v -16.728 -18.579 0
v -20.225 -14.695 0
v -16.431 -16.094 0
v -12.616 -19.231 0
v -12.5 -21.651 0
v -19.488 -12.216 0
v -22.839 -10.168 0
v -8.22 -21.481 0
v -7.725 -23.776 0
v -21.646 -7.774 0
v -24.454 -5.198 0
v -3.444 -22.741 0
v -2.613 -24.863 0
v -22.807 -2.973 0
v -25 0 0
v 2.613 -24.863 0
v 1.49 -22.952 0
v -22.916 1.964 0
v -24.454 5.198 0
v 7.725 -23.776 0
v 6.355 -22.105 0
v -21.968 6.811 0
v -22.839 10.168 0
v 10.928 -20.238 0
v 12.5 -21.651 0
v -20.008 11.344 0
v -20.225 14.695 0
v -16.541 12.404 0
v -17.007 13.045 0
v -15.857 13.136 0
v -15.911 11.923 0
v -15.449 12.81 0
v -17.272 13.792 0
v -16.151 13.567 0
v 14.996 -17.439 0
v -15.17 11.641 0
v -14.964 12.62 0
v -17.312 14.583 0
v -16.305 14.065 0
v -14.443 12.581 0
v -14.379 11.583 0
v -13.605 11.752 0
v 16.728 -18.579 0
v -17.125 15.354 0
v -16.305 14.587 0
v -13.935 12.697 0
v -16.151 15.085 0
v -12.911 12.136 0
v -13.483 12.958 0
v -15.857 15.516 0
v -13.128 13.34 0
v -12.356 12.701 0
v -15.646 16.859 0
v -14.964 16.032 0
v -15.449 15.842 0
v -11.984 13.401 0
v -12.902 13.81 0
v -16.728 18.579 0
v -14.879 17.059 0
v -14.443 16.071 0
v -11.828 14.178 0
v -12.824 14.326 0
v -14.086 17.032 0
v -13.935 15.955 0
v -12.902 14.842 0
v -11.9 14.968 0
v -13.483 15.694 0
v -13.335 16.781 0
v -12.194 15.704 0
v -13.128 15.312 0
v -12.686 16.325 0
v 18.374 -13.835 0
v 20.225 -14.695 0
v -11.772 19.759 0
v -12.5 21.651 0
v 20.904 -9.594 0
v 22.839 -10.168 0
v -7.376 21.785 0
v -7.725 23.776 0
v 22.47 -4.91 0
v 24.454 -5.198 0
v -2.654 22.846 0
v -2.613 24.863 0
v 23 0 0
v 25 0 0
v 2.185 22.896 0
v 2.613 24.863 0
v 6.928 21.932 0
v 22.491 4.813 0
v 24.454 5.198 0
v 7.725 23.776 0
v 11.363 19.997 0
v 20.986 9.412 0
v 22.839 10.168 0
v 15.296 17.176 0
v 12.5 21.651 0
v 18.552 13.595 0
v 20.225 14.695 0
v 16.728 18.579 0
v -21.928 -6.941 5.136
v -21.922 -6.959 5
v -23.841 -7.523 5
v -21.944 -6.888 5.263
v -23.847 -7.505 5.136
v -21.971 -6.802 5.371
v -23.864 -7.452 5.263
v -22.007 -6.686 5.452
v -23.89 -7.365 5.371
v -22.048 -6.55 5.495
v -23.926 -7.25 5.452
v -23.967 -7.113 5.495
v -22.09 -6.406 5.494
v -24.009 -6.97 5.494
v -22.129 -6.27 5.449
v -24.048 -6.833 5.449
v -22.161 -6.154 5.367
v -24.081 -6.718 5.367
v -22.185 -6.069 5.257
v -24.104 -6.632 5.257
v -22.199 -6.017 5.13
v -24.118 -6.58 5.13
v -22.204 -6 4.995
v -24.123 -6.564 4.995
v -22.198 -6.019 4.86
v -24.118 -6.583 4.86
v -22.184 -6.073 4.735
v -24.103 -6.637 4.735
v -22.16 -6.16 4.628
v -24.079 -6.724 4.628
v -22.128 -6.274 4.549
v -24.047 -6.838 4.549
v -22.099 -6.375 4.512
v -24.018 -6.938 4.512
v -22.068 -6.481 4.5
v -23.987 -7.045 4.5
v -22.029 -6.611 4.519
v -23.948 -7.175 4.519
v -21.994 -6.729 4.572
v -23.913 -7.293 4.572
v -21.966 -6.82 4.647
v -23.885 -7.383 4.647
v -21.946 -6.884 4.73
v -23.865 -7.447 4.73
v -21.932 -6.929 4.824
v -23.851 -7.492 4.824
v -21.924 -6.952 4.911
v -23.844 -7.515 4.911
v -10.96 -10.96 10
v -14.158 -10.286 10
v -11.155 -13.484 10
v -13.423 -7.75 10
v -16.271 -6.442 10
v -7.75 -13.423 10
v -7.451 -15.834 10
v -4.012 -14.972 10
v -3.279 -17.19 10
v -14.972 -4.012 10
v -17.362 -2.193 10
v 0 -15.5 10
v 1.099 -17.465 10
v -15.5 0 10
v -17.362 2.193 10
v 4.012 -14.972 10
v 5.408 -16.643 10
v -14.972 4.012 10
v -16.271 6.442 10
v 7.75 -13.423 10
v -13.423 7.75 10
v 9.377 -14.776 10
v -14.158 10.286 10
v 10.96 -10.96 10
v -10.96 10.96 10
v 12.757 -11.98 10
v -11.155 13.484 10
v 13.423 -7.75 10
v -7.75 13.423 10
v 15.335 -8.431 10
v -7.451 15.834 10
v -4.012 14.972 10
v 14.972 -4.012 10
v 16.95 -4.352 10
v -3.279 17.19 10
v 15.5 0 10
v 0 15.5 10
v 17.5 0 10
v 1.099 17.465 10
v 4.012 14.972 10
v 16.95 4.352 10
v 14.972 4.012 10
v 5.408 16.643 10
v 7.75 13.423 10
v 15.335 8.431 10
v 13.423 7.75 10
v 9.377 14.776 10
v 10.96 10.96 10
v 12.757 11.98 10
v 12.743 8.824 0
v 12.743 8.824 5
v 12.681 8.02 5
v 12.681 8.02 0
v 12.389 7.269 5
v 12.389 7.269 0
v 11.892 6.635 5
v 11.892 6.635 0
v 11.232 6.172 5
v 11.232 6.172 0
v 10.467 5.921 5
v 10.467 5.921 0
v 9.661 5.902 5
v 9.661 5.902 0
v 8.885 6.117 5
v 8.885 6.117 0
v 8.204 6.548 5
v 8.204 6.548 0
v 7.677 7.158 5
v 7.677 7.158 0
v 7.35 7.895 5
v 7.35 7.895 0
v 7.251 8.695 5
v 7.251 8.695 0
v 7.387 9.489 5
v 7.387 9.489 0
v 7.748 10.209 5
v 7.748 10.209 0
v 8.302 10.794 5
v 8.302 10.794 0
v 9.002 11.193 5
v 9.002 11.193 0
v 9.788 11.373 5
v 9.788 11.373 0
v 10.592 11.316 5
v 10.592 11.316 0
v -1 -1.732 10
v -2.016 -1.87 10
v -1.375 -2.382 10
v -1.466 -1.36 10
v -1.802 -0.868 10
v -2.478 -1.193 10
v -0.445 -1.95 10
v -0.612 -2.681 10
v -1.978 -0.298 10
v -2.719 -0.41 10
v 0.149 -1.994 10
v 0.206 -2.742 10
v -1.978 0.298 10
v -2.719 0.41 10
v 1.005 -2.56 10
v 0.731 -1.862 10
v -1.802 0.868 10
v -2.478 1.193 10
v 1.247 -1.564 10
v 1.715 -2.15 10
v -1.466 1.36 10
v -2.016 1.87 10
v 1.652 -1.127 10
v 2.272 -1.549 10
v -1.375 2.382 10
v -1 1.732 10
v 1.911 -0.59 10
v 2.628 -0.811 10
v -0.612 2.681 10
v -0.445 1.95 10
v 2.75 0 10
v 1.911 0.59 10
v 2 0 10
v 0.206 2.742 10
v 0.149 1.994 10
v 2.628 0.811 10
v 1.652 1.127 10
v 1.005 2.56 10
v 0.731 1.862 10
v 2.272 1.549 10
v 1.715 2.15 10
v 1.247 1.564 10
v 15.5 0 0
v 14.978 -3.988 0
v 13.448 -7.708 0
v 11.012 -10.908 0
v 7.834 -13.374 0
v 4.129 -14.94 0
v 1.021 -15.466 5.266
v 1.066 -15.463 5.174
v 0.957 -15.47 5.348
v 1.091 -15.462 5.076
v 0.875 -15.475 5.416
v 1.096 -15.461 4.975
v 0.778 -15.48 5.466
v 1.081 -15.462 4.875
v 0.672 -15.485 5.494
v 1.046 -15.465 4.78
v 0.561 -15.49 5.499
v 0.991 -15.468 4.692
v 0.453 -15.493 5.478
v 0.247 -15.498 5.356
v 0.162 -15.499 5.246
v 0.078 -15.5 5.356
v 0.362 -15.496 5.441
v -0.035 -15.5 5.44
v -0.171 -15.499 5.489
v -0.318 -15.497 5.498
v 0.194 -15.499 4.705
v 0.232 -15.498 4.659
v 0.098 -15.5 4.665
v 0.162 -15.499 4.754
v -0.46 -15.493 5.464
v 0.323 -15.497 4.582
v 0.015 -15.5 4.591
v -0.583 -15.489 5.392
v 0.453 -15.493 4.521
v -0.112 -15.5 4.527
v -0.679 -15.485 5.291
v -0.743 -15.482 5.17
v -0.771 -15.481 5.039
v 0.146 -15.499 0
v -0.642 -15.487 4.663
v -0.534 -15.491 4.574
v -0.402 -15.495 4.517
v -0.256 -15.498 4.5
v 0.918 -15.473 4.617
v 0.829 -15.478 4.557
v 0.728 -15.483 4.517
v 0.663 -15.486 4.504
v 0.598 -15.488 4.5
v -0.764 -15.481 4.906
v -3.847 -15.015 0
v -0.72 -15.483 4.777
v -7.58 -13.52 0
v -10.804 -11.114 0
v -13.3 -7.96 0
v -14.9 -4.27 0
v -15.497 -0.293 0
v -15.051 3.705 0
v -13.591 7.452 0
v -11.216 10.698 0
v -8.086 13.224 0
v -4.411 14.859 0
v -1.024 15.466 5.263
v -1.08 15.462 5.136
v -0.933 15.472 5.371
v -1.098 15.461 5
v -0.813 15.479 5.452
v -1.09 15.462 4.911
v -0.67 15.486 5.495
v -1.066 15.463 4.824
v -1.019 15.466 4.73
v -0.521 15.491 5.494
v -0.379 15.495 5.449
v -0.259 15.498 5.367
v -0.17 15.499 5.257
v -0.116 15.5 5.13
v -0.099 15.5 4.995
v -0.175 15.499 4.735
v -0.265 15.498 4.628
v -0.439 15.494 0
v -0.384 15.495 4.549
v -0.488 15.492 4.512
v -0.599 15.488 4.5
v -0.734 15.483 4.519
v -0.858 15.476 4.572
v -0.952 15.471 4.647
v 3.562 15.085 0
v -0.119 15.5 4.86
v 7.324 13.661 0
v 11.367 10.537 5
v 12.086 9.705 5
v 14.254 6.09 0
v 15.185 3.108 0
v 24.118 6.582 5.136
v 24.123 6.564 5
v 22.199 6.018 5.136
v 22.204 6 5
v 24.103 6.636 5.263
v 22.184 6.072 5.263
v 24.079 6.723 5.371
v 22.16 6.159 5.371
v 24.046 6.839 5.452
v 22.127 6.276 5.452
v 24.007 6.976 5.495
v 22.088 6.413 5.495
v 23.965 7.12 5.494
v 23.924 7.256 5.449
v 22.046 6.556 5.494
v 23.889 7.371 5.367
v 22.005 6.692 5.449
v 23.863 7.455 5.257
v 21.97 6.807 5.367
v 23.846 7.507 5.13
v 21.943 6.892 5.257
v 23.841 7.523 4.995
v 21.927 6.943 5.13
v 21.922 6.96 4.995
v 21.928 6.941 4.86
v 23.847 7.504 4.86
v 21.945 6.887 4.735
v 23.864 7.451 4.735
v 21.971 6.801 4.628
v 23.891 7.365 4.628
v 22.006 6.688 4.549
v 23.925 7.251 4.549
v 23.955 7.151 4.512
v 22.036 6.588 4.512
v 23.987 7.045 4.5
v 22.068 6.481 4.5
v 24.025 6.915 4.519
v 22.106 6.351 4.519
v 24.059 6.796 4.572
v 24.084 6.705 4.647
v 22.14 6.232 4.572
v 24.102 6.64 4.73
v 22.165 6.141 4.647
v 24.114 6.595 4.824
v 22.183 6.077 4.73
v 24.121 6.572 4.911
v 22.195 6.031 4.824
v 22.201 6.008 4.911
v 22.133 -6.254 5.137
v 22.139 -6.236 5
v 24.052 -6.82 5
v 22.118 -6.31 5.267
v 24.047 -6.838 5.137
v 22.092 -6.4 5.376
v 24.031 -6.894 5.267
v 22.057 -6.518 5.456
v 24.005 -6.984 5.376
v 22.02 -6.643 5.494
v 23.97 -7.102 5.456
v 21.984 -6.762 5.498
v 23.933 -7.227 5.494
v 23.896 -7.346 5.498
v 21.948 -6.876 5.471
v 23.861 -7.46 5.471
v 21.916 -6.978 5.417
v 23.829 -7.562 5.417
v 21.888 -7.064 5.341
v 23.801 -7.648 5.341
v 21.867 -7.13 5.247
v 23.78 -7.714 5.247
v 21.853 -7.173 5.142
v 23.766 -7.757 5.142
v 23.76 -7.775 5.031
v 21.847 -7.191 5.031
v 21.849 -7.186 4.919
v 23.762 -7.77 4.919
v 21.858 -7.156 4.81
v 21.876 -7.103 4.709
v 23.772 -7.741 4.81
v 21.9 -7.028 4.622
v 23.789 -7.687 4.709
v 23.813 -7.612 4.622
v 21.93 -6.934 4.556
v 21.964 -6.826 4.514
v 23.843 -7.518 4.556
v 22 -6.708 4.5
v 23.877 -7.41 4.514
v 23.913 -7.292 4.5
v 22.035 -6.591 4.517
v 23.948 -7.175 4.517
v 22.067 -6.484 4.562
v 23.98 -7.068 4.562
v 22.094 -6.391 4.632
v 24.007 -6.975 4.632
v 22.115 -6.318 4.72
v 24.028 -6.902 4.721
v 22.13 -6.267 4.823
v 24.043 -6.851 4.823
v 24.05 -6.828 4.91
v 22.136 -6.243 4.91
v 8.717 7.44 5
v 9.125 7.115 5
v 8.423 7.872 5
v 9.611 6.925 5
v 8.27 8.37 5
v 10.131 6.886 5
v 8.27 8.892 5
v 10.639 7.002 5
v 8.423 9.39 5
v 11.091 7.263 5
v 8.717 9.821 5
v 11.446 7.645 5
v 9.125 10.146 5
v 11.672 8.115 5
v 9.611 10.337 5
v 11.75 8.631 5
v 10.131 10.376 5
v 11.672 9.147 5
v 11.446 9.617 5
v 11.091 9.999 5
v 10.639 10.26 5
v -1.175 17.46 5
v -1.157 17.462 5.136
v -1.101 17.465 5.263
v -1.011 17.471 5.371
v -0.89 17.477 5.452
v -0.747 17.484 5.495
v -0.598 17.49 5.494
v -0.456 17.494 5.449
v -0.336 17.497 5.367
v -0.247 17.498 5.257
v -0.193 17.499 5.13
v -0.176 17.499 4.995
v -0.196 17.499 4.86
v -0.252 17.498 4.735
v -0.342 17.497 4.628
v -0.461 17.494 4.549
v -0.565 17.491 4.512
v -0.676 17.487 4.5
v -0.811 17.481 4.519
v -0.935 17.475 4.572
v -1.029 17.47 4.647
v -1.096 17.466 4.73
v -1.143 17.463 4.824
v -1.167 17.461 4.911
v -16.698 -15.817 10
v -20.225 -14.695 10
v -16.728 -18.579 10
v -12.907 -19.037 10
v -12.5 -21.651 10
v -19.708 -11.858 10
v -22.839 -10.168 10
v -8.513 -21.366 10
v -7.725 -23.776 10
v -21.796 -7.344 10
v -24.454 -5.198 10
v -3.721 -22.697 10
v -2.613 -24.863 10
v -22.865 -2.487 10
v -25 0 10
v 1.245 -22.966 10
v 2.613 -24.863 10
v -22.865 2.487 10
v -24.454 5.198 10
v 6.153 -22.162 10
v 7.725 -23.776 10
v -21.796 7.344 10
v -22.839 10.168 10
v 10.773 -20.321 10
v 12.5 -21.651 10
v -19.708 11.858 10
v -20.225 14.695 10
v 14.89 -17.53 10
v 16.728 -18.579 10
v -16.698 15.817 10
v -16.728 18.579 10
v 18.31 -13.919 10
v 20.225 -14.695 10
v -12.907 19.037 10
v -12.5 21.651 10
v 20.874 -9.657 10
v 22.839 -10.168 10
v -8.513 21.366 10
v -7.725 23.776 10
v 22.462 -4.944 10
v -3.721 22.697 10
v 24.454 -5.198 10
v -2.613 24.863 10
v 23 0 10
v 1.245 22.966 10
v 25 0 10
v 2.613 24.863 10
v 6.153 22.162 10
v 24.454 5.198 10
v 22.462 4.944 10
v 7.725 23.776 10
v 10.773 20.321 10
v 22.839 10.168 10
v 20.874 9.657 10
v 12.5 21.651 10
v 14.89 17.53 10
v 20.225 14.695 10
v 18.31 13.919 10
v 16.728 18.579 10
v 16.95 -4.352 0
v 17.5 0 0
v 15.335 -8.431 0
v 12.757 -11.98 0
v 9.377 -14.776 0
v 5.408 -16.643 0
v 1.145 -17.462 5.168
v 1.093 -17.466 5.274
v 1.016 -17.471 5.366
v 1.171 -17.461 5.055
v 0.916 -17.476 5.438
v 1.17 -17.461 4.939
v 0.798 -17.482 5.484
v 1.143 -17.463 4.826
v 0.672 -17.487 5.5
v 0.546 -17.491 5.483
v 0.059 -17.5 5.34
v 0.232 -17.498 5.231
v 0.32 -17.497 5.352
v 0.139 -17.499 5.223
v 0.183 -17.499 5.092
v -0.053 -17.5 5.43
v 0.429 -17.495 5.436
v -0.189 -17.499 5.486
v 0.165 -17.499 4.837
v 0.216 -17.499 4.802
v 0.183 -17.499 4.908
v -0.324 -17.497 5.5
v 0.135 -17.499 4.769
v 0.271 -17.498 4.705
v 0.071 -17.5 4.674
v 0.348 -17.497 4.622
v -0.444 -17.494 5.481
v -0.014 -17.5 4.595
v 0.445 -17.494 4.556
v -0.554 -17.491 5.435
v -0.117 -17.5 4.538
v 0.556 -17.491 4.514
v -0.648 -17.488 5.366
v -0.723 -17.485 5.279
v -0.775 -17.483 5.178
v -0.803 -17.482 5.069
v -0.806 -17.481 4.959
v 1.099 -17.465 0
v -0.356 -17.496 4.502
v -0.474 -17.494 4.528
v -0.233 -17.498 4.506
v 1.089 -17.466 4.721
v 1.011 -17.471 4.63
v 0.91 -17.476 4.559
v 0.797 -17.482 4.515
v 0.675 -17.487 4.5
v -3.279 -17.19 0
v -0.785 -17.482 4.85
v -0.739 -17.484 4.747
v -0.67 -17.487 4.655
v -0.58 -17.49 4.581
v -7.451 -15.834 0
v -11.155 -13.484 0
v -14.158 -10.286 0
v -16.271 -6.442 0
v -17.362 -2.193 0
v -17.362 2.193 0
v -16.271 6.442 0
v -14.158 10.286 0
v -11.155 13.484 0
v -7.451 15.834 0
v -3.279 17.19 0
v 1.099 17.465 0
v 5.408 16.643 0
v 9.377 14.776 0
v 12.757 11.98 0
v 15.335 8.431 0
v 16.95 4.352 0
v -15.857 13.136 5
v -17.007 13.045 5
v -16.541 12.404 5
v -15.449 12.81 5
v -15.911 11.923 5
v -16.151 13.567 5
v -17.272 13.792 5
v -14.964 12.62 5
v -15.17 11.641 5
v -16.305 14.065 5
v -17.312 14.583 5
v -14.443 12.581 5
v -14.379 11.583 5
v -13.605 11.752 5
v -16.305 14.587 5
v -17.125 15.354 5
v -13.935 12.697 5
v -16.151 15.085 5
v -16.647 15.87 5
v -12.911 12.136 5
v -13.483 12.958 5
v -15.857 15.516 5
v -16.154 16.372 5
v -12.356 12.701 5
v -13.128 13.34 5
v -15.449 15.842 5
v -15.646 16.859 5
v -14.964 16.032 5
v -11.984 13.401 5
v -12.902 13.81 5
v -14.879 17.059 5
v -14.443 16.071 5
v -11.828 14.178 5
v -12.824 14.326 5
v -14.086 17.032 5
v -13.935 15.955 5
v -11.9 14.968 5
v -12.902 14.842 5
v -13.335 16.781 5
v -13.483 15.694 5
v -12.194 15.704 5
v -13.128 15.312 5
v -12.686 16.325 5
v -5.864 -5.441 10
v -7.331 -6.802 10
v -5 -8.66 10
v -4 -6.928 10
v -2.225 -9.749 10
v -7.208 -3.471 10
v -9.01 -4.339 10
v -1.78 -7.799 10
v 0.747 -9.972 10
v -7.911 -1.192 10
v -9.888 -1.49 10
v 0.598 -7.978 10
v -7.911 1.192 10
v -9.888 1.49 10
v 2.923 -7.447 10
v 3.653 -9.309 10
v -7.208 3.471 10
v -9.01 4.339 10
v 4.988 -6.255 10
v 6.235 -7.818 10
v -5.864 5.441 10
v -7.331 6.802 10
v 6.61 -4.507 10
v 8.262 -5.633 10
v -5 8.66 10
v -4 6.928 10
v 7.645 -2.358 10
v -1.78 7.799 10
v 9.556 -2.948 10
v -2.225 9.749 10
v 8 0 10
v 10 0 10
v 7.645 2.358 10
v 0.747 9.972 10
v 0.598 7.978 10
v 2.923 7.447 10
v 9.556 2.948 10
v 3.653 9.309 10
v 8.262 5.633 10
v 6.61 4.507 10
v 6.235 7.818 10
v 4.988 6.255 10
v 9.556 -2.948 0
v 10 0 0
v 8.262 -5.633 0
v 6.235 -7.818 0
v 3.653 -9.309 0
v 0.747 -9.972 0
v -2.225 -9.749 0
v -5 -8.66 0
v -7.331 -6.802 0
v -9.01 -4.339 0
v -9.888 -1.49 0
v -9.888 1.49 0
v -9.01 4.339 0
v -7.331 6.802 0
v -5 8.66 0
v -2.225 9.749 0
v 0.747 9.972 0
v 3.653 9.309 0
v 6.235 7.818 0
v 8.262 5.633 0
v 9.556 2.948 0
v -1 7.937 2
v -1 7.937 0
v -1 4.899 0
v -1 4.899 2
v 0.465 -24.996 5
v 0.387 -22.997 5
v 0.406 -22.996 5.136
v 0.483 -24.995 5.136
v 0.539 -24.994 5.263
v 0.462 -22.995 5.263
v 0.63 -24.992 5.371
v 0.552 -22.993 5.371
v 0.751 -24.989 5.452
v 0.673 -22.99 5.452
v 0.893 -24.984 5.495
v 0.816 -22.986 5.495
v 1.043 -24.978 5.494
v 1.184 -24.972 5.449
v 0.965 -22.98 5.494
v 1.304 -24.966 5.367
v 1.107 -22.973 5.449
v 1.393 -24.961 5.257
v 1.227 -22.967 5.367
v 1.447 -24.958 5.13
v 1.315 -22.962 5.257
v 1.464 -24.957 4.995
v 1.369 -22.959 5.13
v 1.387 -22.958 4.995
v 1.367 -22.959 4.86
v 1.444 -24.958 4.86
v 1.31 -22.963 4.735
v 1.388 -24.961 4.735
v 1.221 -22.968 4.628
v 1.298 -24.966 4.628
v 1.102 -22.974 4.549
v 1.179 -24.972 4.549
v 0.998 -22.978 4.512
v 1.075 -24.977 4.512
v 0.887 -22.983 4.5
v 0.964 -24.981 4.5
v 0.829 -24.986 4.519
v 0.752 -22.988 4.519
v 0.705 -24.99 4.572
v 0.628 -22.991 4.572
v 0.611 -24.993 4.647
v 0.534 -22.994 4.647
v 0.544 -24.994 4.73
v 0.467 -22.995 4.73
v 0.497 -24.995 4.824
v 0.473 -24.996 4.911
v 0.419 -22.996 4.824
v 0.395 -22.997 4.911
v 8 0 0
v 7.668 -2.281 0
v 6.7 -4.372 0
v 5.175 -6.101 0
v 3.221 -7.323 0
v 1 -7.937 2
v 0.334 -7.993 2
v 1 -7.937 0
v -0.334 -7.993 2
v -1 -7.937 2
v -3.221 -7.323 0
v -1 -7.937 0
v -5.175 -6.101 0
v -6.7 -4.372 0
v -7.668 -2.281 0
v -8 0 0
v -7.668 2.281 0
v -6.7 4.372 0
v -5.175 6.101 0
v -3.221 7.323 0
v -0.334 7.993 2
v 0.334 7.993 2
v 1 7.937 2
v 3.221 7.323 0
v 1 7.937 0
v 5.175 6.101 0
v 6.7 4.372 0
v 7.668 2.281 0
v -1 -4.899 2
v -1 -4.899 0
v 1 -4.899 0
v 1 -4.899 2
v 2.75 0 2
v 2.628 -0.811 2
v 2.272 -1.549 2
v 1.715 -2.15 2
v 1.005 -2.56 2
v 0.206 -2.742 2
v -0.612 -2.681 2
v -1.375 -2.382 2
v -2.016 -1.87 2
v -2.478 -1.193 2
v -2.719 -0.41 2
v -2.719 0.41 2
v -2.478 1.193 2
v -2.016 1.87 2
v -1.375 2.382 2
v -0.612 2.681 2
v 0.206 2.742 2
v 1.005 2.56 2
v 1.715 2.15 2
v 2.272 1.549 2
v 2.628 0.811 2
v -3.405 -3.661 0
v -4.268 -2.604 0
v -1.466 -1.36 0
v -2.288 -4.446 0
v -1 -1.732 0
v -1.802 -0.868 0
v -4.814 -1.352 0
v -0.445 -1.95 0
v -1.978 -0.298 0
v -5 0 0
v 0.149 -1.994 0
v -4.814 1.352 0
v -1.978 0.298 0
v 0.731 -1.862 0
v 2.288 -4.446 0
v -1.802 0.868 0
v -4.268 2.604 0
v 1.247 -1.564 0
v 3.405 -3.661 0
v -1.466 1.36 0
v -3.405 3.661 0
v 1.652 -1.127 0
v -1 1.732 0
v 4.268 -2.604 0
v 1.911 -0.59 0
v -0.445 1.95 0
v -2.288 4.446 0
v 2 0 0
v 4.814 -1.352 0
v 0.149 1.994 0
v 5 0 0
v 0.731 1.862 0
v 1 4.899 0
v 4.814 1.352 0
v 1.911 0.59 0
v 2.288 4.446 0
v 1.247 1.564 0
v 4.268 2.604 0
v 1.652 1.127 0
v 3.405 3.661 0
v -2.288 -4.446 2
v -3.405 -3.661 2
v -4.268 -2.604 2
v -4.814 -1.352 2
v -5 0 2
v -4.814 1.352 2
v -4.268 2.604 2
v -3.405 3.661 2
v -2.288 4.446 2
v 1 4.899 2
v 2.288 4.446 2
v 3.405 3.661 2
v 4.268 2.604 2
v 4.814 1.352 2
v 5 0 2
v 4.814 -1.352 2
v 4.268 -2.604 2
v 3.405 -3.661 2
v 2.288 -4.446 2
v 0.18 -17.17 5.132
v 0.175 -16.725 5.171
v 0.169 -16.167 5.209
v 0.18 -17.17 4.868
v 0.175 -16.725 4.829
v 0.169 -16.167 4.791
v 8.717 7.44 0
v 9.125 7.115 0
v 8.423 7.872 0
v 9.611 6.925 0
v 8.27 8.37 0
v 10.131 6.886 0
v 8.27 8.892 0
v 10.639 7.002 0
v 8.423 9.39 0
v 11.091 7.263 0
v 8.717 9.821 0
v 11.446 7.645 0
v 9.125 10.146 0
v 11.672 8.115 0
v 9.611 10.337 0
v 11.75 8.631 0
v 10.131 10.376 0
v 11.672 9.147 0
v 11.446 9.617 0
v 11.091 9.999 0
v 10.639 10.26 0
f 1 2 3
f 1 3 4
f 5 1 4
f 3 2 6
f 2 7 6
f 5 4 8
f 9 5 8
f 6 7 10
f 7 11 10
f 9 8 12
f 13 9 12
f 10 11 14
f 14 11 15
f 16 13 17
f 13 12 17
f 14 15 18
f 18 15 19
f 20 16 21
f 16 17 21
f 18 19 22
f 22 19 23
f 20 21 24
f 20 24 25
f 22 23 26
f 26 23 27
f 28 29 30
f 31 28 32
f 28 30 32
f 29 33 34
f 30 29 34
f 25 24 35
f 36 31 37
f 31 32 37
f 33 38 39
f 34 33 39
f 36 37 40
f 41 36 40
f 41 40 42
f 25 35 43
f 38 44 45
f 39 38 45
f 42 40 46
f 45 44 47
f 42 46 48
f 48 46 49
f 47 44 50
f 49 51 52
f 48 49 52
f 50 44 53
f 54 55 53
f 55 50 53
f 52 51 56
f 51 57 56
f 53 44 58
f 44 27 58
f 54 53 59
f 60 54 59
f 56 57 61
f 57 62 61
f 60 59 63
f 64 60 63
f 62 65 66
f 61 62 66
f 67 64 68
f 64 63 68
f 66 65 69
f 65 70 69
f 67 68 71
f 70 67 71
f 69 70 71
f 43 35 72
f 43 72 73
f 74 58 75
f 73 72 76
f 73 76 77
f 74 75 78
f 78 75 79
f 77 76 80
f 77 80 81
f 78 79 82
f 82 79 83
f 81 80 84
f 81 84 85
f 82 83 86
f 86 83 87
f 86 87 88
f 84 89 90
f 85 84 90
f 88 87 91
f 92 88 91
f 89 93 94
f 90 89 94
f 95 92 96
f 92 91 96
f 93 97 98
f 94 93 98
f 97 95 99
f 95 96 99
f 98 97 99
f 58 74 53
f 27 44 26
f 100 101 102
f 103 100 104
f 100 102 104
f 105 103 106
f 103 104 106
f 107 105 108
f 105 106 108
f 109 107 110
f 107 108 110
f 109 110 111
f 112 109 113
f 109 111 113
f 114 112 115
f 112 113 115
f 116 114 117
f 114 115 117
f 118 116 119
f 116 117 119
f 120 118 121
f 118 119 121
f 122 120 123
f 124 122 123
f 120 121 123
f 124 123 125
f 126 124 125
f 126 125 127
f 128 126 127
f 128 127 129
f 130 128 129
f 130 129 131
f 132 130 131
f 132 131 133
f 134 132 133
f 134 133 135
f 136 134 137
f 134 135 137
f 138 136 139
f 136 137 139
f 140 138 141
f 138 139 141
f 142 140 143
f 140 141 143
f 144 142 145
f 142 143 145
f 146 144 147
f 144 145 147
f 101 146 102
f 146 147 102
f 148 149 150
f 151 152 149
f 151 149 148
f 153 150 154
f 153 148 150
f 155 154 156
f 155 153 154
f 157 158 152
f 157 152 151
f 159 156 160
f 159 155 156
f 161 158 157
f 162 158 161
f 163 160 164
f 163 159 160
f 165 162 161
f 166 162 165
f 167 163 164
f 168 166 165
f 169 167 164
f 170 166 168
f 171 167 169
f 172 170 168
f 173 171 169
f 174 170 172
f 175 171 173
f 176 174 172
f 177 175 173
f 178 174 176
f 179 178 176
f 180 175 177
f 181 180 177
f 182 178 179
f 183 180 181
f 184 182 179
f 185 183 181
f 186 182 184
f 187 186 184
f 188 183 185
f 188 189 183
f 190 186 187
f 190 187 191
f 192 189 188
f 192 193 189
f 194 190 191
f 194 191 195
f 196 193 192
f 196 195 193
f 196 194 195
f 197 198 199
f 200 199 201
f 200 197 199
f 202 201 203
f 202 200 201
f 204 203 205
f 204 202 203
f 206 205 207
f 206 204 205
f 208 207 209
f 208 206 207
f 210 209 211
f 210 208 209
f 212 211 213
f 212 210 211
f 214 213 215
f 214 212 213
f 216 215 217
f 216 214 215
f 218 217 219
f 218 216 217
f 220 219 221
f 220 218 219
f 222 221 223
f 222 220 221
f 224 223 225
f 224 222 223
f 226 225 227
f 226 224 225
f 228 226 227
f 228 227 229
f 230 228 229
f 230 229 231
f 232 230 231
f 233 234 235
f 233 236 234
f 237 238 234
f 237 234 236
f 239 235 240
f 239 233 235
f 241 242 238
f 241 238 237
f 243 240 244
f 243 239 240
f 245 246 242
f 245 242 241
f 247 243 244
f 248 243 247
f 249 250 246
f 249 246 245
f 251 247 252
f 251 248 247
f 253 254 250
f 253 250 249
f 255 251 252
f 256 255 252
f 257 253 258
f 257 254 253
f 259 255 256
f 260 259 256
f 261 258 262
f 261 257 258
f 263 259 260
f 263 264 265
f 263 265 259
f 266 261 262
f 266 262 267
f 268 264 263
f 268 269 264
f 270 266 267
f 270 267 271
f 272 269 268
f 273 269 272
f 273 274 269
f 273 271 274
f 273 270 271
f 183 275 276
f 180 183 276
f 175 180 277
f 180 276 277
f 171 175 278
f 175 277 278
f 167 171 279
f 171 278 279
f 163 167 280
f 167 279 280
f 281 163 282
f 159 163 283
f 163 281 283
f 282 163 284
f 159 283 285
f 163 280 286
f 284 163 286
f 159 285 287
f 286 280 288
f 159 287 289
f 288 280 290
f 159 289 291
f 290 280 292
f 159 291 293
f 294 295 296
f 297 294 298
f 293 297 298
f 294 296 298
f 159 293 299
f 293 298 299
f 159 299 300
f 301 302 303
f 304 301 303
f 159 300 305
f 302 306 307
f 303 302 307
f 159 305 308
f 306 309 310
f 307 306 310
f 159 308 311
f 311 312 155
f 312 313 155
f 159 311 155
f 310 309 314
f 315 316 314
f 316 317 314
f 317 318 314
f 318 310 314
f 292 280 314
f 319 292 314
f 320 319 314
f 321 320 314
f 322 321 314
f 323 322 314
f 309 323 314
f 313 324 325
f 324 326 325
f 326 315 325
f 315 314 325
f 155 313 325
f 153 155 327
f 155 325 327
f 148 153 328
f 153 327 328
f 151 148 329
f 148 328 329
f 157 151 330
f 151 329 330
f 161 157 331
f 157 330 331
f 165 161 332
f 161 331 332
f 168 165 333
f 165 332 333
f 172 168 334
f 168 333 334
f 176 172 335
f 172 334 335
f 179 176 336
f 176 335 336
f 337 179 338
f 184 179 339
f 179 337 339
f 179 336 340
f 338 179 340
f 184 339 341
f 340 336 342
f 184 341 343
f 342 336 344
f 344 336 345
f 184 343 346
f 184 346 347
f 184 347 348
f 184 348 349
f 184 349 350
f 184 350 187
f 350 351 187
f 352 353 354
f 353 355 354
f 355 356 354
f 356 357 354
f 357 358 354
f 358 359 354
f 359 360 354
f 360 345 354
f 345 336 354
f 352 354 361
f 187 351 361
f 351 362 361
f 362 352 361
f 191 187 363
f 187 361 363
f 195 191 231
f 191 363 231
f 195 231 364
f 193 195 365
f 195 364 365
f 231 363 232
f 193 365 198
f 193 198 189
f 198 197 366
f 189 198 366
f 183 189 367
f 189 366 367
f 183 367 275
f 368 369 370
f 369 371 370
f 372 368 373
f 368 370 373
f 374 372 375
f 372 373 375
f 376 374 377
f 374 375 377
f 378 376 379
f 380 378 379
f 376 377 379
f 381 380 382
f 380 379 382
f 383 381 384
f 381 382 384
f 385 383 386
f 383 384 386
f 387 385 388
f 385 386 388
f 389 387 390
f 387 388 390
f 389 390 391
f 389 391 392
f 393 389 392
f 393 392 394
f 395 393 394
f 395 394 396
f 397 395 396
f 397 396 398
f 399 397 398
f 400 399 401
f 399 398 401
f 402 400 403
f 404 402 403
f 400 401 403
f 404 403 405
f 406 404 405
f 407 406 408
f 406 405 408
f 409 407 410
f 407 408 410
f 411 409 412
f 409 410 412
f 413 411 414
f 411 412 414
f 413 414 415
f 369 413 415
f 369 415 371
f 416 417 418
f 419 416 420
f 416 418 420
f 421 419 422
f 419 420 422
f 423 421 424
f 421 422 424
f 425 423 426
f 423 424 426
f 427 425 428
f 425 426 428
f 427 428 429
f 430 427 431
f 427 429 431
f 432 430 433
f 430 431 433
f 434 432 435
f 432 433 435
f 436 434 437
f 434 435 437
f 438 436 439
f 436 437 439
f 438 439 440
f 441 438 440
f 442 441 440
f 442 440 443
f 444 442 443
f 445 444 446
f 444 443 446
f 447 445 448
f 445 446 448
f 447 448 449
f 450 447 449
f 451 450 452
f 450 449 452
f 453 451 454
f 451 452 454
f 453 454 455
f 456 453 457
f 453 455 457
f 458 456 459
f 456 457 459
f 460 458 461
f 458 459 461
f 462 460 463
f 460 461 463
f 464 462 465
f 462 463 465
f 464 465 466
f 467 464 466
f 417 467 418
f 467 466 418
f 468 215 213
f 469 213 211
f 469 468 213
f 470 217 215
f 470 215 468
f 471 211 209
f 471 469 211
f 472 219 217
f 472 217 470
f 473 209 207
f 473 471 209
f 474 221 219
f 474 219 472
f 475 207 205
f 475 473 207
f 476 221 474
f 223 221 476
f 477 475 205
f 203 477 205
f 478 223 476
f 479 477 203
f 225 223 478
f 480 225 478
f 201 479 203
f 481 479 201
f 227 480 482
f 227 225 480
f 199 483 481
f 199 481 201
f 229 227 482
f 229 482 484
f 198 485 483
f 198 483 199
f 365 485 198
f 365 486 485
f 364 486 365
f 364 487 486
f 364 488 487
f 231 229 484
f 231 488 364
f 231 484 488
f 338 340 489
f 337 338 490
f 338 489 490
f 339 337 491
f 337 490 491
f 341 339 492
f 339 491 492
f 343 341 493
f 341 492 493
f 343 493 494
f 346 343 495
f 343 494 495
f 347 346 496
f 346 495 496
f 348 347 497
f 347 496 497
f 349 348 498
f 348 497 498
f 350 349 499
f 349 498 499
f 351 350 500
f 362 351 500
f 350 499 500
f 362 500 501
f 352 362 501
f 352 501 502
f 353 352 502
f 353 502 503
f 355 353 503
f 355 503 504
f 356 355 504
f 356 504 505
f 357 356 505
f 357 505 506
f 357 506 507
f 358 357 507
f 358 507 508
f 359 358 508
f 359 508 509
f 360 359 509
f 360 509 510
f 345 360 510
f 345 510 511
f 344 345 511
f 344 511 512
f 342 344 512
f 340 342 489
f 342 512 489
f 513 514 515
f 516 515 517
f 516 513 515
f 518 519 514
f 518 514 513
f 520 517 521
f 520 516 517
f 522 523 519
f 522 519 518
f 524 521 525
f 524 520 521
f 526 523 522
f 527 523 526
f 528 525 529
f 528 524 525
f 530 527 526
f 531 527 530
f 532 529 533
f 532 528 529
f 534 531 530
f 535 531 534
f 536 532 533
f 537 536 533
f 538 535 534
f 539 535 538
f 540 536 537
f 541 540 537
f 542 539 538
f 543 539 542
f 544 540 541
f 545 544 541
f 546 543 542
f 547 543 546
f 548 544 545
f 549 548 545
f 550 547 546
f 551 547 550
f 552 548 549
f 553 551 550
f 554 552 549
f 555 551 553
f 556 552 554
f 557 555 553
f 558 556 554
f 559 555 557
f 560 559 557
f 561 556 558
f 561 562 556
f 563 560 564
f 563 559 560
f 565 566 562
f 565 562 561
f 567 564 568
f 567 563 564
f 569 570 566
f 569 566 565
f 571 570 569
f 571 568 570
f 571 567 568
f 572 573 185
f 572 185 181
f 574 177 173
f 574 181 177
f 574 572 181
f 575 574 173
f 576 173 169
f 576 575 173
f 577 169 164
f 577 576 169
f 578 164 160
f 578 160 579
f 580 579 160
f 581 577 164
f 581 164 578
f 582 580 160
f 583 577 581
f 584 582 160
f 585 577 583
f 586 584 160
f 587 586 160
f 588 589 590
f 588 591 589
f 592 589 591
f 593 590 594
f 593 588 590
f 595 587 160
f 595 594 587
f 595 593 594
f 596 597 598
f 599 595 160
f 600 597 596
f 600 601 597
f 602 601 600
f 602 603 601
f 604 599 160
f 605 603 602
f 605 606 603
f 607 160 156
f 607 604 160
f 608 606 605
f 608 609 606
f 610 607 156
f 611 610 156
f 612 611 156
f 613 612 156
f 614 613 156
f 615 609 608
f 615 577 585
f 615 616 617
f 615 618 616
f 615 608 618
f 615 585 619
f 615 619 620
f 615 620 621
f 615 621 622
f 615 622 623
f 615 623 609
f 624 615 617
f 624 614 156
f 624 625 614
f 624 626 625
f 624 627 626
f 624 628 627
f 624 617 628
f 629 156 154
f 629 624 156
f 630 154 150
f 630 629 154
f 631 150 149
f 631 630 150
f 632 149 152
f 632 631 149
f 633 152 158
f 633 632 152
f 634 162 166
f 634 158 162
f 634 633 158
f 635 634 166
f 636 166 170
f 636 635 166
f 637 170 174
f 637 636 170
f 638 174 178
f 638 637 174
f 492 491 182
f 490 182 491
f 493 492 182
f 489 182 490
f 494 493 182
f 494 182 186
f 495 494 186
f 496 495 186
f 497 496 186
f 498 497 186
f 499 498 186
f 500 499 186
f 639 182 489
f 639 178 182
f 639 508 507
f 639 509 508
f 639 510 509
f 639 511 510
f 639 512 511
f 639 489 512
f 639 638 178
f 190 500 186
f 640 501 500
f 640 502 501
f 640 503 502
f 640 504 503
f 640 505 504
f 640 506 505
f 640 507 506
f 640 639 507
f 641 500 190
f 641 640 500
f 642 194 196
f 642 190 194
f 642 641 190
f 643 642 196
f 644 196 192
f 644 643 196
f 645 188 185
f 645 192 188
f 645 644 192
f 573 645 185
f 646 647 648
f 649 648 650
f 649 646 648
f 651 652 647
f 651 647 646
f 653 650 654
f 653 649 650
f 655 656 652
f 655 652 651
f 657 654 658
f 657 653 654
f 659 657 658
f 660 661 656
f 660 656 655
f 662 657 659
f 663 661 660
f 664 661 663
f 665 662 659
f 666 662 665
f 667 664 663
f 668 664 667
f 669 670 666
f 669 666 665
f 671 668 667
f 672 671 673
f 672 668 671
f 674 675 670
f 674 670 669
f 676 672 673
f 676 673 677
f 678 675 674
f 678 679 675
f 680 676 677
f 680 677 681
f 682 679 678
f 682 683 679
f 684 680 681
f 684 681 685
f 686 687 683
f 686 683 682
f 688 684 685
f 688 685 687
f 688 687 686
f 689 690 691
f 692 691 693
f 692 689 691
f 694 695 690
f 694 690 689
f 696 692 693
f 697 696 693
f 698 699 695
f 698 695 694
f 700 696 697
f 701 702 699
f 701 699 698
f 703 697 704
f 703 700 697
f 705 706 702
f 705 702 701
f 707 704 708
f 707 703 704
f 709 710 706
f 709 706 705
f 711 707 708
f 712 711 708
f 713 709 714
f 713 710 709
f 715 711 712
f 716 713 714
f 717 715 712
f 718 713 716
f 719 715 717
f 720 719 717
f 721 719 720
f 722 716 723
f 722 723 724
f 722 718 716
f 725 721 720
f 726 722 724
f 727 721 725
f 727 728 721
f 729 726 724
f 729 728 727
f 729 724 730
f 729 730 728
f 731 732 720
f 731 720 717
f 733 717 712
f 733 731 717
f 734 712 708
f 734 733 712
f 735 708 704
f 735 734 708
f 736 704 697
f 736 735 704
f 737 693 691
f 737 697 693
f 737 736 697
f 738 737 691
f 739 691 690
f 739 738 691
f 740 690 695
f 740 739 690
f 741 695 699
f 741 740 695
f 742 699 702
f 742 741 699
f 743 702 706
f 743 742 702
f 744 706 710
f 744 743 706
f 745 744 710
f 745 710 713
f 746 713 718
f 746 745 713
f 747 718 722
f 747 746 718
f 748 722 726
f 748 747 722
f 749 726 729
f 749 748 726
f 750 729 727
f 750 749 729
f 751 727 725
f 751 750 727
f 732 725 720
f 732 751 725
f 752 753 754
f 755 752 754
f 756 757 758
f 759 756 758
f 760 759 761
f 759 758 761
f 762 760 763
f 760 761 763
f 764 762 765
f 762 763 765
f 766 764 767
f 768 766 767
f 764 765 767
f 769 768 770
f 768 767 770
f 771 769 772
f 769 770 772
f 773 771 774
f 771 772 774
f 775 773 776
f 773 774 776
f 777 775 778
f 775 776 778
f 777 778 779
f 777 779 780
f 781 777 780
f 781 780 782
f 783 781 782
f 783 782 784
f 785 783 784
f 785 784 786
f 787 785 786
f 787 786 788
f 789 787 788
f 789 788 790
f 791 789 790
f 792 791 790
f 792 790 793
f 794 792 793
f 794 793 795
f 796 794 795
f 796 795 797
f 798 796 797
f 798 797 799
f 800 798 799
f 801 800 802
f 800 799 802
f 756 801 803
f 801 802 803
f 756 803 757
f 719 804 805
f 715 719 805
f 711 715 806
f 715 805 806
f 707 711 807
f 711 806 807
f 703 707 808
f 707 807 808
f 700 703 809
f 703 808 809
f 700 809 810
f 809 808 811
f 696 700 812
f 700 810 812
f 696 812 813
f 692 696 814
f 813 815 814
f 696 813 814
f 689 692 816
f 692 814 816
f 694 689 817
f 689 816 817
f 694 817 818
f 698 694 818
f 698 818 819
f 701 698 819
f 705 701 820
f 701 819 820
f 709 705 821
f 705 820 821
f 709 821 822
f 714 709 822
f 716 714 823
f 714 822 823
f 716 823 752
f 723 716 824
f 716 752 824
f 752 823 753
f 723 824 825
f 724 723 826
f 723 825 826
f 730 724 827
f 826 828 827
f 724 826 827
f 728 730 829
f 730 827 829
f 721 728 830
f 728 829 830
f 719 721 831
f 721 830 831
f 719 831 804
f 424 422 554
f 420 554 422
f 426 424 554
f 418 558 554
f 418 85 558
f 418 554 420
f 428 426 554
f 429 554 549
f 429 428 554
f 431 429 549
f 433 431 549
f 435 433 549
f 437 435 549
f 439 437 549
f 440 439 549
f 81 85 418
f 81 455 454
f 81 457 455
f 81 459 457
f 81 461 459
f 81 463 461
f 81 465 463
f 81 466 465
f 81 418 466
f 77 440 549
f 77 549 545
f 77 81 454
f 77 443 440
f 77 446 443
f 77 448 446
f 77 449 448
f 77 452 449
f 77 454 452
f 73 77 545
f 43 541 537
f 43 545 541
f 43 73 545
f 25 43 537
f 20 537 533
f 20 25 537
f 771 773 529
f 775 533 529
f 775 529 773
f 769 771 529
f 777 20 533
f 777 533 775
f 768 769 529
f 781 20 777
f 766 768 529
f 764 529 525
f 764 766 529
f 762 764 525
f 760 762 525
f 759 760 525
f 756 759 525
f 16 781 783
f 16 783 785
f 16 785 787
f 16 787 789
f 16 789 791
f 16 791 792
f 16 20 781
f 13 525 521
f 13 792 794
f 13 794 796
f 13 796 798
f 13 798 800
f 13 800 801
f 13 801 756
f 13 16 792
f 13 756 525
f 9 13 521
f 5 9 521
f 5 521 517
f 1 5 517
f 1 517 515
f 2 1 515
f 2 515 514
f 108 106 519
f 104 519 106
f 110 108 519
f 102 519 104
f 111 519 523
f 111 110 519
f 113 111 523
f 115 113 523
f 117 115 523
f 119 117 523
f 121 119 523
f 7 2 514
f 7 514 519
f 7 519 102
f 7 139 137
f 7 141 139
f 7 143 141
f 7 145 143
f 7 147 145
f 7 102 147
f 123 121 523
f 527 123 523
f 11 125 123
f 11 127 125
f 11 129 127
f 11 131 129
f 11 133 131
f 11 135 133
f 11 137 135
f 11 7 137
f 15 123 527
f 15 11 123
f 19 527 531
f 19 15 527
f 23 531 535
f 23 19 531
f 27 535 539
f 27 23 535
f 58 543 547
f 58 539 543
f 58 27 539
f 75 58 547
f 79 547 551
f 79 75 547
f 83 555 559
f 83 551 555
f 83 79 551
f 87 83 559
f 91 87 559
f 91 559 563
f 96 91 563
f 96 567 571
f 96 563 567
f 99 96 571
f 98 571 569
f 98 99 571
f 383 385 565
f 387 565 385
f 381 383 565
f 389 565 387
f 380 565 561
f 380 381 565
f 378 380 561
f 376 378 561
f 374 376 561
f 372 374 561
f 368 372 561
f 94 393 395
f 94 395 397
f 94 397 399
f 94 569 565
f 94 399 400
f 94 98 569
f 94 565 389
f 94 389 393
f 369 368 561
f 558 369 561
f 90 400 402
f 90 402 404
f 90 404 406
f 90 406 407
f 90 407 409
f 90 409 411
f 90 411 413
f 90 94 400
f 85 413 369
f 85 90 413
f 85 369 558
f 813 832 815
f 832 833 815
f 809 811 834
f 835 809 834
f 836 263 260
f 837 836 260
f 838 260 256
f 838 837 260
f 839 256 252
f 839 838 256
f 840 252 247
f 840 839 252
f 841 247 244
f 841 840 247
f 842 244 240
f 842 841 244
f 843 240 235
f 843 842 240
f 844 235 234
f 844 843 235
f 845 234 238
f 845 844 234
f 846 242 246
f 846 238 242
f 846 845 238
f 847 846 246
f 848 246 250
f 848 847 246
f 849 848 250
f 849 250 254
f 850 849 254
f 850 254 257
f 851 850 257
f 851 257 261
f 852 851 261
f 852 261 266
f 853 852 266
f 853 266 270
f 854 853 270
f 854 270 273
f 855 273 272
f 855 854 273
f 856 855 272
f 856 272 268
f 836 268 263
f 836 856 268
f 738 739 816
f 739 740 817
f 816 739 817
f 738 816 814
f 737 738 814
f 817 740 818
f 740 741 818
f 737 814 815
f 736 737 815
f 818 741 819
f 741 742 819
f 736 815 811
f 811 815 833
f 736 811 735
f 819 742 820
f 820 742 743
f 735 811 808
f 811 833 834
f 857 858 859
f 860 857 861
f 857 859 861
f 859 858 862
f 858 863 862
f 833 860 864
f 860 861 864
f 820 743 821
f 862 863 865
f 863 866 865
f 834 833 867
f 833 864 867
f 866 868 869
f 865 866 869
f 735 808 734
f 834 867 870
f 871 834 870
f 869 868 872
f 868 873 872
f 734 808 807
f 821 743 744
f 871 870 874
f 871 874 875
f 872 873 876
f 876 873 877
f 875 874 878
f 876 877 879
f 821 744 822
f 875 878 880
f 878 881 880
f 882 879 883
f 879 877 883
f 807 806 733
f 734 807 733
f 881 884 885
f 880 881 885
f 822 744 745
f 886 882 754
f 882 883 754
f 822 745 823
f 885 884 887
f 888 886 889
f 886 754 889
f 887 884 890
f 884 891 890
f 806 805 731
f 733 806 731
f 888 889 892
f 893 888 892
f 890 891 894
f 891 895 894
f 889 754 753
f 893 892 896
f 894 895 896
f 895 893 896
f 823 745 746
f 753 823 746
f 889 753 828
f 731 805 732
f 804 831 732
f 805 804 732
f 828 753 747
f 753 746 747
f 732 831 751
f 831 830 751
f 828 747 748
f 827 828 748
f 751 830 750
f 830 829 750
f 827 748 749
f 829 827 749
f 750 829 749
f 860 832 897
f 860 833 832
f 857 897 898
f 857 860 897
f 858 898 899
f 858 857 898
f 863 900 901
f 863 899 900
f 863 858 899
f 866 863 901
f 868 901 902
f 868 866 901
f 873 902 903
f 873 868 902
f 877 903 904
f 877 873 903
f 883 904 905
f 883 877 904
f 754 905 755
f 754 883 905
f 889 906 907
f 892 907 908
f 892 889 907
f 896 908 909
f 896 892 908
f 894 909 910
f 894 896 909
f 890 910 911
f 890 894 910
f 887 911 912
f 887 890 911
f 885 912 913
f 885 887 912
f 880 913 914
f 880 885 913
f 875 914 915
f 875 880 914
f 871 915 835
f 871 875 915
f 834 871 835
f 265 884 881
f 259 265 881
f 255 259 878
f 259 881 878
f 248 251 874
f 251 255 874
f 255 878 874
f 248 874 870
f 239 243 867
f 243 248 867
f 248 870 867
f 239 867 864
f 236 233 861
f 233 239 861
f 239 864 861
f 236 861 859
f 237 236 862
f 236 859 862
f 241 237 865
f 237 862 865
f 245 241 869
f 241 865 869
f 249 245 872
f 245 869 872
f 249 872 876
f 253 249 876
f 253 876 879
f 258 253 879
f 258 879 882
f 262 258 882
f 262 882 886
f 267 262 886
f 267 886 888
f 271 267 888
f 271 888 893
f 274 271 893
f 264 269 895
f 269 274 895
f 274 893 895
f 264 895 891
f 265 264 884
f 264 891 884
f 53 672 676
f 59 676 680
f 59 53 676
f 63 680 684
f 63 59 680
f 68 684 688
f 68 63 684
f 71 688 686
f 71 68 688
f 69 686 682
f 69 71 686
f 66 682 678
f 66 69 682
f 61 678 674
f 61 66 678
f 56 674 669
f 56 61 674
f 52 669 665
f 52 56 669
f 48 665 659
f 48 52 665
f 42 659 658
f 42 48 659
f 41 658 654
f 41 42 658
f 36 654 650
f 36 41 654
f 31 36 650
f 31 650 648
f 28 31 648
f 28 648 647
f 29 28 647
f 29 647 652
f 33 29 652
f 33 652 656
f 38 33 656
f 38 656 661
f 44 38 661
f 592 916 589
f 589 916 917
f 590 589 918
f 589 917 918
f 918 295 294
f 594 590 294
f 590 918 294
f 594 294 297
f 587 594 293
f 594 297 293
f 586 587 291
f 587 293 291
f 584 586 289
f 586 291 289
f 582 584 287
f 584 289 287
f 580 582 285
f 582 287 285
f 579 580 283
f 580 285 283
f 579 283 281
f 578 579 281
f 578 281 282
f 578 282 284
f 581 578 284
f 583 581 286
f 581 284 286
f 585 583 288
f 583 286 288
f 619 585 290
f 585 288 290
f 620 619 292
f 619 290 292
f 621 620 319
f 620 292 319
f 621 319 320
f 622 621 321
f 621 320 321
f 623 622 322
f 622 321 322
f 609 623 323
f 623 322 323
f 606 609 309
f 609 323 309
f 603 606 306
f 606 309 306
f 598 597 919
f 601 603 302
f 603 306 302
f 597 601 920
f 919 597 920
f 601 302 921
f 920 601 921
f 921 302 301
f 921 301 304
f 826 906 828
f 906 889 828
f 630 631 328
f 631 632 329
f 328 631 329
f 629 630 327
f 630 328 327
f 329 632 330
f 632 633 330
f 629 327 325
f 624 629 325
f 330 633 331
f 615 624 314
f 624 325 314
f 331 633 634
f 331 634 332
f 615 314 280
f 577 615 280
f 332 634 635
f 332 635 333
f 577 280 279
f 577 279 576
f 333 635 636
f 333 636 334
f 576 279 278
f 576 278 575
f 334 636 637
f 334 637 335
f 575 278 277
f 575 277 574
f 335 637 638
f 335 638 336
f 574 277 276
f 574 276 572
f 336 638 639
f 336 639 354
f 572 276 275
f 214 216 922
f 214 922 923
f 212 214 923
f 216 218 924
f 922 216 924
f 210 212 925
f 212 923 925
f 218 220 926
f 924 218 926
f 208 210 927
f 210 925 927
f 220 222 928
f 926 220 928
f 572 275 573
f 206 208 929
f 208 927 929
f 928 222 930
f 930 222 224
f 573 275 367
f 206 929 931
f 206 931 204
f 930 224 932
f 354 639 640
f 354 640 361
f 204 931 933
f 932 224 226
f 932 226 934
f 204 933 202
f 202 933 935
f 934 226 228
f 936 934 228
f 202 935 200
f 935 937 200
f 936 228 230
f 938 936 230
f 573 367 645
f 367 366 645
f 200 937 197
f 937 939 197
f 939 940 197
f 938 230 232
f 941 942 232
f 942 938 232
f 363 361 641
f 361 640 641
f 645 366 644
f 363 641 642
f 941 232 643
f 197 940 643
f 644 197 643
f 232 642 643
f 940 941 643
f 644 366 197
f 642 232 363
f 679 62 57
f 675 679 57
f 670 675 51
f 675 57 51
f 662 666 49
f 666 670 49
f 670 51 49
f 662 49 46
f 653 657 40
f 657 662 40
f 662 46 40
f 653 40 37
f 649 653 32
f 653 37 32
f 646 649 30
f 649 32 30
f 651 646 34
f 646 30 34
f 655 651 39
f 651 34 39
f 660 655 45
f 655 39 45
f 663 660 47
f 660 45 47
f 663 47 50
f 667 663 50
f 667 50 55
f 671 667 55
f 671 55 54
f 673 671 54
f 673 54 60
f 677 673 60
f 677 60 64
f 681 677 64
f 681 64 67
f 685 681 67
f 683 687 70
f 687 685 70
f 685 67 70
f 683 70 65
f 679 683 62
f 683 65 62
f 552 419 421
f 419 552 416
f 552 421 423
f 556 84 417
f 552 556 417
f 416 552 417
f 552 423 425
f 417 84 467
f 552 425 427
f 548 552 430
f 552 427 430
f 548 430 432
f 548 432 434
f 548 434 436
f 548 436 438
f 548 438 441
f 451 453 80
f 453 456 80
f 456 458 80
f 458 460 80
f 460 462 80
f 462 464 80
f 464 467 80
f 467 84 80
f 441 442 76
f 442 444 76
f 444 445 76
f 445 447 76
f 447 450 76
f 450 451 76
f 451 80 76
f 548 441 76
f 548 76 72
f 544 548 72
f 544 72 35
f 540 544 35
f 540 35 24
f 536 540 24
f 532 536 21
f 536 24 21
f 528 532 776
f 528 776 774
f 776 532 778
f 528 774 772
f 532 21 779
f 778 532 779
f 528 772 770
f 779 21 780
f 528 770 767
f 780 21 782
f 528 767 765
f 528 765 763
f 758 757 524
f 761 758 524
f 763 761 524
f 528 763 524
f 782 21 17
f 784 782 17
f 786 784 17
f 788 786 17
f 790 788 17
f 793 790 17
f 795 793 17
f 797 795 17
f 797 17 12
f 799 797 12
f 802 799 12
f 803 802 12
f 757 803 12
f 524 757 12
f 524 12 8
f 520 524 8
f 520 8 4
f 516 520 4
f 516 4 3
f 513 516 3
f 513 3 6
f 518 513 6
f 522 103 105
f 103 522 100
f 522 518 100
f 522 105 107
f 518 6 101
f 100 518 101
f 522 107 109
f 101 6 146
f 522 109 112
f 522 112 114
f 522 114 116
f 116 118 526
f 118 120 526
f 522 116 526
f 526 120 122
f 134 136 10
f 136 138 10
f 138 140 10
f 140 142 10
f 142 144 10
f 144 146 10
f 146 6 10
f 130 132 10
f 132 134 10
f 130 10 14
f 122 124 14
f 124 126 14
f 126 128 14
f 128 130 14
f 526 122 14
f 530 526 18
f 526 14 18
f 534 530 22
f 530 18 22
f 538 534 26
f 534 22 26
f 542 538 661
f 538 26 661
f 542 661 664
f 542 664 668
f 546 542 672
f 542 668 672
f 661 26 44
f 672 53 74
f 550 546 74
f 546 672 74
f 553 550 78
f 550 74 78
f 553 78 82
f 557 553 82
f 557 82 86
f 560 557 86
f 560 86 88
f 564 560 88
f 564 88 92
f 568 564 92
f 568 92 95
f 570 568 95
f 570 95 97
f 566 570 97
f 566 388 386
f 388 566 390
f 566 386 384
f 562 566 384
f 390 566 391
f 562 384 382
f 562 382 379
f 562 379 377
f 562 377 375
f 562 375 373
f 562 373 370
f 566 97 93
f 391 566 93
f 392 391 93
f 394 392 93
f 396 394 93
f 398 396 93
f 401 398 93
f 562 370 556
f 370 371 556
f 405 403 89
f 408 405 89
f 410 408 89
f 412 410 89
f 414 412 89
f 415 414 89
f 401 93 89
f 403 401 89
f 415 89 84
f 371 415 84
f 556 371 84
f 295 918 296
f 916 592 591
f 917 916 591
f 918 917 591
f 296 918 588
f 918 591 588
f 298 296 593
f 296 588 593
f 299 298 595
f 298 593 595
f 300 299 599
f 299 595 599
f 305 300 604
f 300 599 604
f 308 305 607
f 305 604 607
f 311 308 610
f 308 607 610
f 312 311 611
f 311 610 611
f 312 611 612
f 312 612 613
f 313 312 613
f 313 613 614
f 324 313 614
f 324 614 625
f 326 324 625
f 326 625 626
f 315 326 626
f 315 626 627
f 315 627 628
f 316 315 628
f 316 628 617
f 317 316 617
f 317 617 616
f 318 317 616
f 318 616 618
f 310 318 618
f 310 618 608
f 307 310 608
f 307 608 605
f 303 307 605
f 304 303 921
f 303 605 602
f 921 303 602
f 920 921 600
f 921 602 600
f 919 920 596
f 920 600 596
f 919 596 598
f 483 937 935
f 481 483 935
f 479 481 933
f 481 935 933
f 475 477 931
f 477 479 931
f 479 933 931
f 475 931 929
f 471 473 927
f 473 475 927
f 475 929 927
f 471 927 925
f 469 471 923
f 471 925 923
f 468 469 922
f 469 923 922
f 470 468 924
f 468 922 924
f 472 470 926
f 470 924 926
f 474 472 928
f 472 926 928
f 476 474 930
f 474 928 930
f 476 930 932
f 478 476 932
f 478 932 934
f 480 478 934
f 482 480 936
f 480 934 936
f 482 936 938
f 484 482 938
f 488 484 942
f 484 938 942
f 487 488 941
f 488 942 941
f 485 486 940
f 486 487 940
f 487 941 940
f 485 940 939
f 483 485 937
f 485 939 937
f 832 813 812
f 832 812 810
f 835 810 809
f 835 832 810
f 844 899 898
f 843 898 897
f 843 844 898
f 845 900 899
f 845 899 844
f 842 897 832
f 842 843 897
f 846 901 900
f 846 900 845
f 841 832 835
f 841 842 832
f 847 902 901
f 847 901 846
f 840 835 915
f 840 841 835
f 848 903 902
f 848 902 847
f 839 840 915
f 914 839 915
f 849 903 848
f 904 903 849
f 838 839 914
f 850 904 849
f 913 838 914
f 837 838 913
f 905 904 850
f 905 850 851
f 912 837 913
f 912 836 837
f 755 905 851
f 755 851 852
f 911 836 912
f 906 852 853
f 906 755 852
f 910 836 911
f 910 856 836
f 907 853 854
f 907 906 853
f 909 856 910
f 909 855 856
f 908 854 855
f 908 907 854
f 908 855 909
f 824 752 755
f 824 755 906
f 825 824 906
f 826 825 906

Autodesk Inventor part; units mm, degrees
ref_plane "YZ Plane" through (0, 0, 0) normal (1, 0, 0) x (0, 1, 0)
ref_plane "XZ Plane" through (0, 0, 0) normal (0, 1, 0) x (-1, 0, 0)
ref_plane "XY Plane" through (0, 0, 0) normal (0, 0, 1) x (1, 0, 0)
sketch "Sketch1" plane through (0, 0, 0) normal (0, 0, 1) x (1, 0, 0)
  circle A0 centre (0, 0) radius 25
  circle A1 centre (0, 0) radius 23
  circle A2 centre (0, 0) radius 17.5
  circle A3 centre (0, 0) radius 15.5
  circle A4 centre (0, 0) radius 10
  circle A5 centre (0, 0) radius 8
  circle A6 centre (0, 0) radius 5
  line L0 (-0.4916, -7.9849) -> (0.4916, 7.9849) construction
  line L1 (0.4916, -7.9849) -> (-0.4916, 7.9849) construction
  circle A7 centre (0, 0) radius 2
  line L2 (-1, 7.9373) -> (-1, 4.899)
  line L3 (-1, -4.899) -> (-1, -7.9373)
  line L4 (1, -7.9373) -> (1, -4.899)
  line L5 (1, 4.899) -> (1, 7.9373)
  circle A8 centre (0, 0) radius 2.75
  circle A9 centre (10, 8.6308) radius 2.75
  circle A10 centre (10, 8.6308) radius 1.75
  circle A11 centre (-14.5742, 14.326) radius 2.75
  circle A12 centre (-14.5742, 14.326) radius 1.75
  point P0 (-23.9869, -7.0447)
  point P1 (23.9106, -7.2995)
  point P2 (-0.7169, 22.9888)
  point P3 (-0.308, -17.4973)
  point P4 (-0.6761, 17.4869)
  point P5 (-17.125, 15.3536)
  point P6 (-15.6456, 16.8587)
  point P7 (10.592, 11.3164)
  point P8 (12.7432, 8.8239)
  dimension "d0" = 50
  dimension "d1" = 2
  dimension "d2" = 35
  dimension "d3" = 2
  dimension "d4" = 20
  dimension "d5" = 2
  dimension "d16" = 4
  dimension "d17" = 2
  dimension "d18" = 2
  dimension "d19" = 5.5
  dimension "d58" = 5.5
  dimension "d59" = 3.5
  dimension "d60" = 5.5
  dimension "d61" = 3.5
extrude "Extrusion1" add sketch "Sketch1" along normal blind 10 contours A0 | A1 A11 picked at (-16.4455, 16.1655)
ref_plane "Work Plane1" through (-23.9869, -7.0447, 0) normal (-0.9595, -0.2818, 0) x (0.2818, -0.9595, 0)
sketch "Sketch2" plane through (-23.9869, -7.0447, 0) normal (-0.9595, -0.2818, 0) x (0.2818, -0.9595, 0)
  line L0 (0, 0) -> (0, 5)
  circle A0 centre (0, 5) radius 0.5
  dimension "d22" = 5
  dimension "d23" = 1
extrude "Extrusion2" cut sketch "Sketch2" against normal blind 50
extrude "Extrusion3" add sketch "Sketch1" along normal blind 10 contours A2 | A3 A9 picked at (11.845, 10.2232)
ref_plane "Work Plane2" through (-0.6761, 17.4869, 0) normal (-0.0386, 0.9993, 0) x (-0.9993, -0.0386, 0)
sketch "Sketch3" plane through (-0.6761, 17.4869, 0) normal (-0.0386, 0.9993, 0) x (-0.9993, -0.0386, 0)
  line L0 (0, 0) -> (0, 5)
  circle A0 centre (0, 5) radius 0.5
  dimension "d28" = 5
  dimension "d29" = 1
extrude "Extrusion4" cut sketch "Sketch3" against normal blind 44
extrude "Extrusion5" cut sketch "Sketch2" against normal blind 4.5
ref_plane "Work Plane3" through (23.9106, -7.2995, 0) normal (0.9564, -0.292, 0) x (0.292, 0.9564, 0)
sketch "Sketch4" plane through (23.9106, -7.2995, 0) normal (0.9564, -0.292, 0) x (0.292, 0.9564, 0)
  circle A0 centre (0, 5) radius 0.5 projected
  circle A1 centre (0, 5) radius 0.5
  point P0 (0, 0)
  dimension "d34" = 1
extrude "Extrusion6" cut sketch "Sketch4" against normal blind 4.5
extrude "Extrusion7" add sketch "Sketch1" along normal blind 10 contours A4
extrude "Extrusion8" cut sketch "Sketch3" against normal blind 5
ref_plane "Work Plane4" through (-0.308, -17.4973, 0) normal (-0.0176, -0.9998, 0) x (0.9998, -0.0176, 0)
sketch "Sketch5" plane through (-0.308, -17.4973, 0) normal (-0.0176, -0.9998, 0) x (0.9998, -0.0176, 0)
  circle A0 centre (0, 5) radius 0.5 projected
  circle A1 centre (0, 5) radius 0.5
  point P0 (0, 0)
  dimension "d41" = 1
extrude "Extrusion9" cut sketch "Sketch5" against normal blind 5
extrude "Extrusion10" add sketch "Sketch1" along normal blind 2 contours L5 A6 L2 A5 | A5 L3 A6 L4 | A6
extrude "Extrusion11" add sketch "Sketch1" along normal blind 10 contours A8
extrude "Extrusion12" add sketch "Sketch1" along normal blind 5 contours A11 A1 | A9 A3 picked at (-15.6648, 16.3977) picked at (10.86, 10.7068)
properties part number "improved_gimbal"
